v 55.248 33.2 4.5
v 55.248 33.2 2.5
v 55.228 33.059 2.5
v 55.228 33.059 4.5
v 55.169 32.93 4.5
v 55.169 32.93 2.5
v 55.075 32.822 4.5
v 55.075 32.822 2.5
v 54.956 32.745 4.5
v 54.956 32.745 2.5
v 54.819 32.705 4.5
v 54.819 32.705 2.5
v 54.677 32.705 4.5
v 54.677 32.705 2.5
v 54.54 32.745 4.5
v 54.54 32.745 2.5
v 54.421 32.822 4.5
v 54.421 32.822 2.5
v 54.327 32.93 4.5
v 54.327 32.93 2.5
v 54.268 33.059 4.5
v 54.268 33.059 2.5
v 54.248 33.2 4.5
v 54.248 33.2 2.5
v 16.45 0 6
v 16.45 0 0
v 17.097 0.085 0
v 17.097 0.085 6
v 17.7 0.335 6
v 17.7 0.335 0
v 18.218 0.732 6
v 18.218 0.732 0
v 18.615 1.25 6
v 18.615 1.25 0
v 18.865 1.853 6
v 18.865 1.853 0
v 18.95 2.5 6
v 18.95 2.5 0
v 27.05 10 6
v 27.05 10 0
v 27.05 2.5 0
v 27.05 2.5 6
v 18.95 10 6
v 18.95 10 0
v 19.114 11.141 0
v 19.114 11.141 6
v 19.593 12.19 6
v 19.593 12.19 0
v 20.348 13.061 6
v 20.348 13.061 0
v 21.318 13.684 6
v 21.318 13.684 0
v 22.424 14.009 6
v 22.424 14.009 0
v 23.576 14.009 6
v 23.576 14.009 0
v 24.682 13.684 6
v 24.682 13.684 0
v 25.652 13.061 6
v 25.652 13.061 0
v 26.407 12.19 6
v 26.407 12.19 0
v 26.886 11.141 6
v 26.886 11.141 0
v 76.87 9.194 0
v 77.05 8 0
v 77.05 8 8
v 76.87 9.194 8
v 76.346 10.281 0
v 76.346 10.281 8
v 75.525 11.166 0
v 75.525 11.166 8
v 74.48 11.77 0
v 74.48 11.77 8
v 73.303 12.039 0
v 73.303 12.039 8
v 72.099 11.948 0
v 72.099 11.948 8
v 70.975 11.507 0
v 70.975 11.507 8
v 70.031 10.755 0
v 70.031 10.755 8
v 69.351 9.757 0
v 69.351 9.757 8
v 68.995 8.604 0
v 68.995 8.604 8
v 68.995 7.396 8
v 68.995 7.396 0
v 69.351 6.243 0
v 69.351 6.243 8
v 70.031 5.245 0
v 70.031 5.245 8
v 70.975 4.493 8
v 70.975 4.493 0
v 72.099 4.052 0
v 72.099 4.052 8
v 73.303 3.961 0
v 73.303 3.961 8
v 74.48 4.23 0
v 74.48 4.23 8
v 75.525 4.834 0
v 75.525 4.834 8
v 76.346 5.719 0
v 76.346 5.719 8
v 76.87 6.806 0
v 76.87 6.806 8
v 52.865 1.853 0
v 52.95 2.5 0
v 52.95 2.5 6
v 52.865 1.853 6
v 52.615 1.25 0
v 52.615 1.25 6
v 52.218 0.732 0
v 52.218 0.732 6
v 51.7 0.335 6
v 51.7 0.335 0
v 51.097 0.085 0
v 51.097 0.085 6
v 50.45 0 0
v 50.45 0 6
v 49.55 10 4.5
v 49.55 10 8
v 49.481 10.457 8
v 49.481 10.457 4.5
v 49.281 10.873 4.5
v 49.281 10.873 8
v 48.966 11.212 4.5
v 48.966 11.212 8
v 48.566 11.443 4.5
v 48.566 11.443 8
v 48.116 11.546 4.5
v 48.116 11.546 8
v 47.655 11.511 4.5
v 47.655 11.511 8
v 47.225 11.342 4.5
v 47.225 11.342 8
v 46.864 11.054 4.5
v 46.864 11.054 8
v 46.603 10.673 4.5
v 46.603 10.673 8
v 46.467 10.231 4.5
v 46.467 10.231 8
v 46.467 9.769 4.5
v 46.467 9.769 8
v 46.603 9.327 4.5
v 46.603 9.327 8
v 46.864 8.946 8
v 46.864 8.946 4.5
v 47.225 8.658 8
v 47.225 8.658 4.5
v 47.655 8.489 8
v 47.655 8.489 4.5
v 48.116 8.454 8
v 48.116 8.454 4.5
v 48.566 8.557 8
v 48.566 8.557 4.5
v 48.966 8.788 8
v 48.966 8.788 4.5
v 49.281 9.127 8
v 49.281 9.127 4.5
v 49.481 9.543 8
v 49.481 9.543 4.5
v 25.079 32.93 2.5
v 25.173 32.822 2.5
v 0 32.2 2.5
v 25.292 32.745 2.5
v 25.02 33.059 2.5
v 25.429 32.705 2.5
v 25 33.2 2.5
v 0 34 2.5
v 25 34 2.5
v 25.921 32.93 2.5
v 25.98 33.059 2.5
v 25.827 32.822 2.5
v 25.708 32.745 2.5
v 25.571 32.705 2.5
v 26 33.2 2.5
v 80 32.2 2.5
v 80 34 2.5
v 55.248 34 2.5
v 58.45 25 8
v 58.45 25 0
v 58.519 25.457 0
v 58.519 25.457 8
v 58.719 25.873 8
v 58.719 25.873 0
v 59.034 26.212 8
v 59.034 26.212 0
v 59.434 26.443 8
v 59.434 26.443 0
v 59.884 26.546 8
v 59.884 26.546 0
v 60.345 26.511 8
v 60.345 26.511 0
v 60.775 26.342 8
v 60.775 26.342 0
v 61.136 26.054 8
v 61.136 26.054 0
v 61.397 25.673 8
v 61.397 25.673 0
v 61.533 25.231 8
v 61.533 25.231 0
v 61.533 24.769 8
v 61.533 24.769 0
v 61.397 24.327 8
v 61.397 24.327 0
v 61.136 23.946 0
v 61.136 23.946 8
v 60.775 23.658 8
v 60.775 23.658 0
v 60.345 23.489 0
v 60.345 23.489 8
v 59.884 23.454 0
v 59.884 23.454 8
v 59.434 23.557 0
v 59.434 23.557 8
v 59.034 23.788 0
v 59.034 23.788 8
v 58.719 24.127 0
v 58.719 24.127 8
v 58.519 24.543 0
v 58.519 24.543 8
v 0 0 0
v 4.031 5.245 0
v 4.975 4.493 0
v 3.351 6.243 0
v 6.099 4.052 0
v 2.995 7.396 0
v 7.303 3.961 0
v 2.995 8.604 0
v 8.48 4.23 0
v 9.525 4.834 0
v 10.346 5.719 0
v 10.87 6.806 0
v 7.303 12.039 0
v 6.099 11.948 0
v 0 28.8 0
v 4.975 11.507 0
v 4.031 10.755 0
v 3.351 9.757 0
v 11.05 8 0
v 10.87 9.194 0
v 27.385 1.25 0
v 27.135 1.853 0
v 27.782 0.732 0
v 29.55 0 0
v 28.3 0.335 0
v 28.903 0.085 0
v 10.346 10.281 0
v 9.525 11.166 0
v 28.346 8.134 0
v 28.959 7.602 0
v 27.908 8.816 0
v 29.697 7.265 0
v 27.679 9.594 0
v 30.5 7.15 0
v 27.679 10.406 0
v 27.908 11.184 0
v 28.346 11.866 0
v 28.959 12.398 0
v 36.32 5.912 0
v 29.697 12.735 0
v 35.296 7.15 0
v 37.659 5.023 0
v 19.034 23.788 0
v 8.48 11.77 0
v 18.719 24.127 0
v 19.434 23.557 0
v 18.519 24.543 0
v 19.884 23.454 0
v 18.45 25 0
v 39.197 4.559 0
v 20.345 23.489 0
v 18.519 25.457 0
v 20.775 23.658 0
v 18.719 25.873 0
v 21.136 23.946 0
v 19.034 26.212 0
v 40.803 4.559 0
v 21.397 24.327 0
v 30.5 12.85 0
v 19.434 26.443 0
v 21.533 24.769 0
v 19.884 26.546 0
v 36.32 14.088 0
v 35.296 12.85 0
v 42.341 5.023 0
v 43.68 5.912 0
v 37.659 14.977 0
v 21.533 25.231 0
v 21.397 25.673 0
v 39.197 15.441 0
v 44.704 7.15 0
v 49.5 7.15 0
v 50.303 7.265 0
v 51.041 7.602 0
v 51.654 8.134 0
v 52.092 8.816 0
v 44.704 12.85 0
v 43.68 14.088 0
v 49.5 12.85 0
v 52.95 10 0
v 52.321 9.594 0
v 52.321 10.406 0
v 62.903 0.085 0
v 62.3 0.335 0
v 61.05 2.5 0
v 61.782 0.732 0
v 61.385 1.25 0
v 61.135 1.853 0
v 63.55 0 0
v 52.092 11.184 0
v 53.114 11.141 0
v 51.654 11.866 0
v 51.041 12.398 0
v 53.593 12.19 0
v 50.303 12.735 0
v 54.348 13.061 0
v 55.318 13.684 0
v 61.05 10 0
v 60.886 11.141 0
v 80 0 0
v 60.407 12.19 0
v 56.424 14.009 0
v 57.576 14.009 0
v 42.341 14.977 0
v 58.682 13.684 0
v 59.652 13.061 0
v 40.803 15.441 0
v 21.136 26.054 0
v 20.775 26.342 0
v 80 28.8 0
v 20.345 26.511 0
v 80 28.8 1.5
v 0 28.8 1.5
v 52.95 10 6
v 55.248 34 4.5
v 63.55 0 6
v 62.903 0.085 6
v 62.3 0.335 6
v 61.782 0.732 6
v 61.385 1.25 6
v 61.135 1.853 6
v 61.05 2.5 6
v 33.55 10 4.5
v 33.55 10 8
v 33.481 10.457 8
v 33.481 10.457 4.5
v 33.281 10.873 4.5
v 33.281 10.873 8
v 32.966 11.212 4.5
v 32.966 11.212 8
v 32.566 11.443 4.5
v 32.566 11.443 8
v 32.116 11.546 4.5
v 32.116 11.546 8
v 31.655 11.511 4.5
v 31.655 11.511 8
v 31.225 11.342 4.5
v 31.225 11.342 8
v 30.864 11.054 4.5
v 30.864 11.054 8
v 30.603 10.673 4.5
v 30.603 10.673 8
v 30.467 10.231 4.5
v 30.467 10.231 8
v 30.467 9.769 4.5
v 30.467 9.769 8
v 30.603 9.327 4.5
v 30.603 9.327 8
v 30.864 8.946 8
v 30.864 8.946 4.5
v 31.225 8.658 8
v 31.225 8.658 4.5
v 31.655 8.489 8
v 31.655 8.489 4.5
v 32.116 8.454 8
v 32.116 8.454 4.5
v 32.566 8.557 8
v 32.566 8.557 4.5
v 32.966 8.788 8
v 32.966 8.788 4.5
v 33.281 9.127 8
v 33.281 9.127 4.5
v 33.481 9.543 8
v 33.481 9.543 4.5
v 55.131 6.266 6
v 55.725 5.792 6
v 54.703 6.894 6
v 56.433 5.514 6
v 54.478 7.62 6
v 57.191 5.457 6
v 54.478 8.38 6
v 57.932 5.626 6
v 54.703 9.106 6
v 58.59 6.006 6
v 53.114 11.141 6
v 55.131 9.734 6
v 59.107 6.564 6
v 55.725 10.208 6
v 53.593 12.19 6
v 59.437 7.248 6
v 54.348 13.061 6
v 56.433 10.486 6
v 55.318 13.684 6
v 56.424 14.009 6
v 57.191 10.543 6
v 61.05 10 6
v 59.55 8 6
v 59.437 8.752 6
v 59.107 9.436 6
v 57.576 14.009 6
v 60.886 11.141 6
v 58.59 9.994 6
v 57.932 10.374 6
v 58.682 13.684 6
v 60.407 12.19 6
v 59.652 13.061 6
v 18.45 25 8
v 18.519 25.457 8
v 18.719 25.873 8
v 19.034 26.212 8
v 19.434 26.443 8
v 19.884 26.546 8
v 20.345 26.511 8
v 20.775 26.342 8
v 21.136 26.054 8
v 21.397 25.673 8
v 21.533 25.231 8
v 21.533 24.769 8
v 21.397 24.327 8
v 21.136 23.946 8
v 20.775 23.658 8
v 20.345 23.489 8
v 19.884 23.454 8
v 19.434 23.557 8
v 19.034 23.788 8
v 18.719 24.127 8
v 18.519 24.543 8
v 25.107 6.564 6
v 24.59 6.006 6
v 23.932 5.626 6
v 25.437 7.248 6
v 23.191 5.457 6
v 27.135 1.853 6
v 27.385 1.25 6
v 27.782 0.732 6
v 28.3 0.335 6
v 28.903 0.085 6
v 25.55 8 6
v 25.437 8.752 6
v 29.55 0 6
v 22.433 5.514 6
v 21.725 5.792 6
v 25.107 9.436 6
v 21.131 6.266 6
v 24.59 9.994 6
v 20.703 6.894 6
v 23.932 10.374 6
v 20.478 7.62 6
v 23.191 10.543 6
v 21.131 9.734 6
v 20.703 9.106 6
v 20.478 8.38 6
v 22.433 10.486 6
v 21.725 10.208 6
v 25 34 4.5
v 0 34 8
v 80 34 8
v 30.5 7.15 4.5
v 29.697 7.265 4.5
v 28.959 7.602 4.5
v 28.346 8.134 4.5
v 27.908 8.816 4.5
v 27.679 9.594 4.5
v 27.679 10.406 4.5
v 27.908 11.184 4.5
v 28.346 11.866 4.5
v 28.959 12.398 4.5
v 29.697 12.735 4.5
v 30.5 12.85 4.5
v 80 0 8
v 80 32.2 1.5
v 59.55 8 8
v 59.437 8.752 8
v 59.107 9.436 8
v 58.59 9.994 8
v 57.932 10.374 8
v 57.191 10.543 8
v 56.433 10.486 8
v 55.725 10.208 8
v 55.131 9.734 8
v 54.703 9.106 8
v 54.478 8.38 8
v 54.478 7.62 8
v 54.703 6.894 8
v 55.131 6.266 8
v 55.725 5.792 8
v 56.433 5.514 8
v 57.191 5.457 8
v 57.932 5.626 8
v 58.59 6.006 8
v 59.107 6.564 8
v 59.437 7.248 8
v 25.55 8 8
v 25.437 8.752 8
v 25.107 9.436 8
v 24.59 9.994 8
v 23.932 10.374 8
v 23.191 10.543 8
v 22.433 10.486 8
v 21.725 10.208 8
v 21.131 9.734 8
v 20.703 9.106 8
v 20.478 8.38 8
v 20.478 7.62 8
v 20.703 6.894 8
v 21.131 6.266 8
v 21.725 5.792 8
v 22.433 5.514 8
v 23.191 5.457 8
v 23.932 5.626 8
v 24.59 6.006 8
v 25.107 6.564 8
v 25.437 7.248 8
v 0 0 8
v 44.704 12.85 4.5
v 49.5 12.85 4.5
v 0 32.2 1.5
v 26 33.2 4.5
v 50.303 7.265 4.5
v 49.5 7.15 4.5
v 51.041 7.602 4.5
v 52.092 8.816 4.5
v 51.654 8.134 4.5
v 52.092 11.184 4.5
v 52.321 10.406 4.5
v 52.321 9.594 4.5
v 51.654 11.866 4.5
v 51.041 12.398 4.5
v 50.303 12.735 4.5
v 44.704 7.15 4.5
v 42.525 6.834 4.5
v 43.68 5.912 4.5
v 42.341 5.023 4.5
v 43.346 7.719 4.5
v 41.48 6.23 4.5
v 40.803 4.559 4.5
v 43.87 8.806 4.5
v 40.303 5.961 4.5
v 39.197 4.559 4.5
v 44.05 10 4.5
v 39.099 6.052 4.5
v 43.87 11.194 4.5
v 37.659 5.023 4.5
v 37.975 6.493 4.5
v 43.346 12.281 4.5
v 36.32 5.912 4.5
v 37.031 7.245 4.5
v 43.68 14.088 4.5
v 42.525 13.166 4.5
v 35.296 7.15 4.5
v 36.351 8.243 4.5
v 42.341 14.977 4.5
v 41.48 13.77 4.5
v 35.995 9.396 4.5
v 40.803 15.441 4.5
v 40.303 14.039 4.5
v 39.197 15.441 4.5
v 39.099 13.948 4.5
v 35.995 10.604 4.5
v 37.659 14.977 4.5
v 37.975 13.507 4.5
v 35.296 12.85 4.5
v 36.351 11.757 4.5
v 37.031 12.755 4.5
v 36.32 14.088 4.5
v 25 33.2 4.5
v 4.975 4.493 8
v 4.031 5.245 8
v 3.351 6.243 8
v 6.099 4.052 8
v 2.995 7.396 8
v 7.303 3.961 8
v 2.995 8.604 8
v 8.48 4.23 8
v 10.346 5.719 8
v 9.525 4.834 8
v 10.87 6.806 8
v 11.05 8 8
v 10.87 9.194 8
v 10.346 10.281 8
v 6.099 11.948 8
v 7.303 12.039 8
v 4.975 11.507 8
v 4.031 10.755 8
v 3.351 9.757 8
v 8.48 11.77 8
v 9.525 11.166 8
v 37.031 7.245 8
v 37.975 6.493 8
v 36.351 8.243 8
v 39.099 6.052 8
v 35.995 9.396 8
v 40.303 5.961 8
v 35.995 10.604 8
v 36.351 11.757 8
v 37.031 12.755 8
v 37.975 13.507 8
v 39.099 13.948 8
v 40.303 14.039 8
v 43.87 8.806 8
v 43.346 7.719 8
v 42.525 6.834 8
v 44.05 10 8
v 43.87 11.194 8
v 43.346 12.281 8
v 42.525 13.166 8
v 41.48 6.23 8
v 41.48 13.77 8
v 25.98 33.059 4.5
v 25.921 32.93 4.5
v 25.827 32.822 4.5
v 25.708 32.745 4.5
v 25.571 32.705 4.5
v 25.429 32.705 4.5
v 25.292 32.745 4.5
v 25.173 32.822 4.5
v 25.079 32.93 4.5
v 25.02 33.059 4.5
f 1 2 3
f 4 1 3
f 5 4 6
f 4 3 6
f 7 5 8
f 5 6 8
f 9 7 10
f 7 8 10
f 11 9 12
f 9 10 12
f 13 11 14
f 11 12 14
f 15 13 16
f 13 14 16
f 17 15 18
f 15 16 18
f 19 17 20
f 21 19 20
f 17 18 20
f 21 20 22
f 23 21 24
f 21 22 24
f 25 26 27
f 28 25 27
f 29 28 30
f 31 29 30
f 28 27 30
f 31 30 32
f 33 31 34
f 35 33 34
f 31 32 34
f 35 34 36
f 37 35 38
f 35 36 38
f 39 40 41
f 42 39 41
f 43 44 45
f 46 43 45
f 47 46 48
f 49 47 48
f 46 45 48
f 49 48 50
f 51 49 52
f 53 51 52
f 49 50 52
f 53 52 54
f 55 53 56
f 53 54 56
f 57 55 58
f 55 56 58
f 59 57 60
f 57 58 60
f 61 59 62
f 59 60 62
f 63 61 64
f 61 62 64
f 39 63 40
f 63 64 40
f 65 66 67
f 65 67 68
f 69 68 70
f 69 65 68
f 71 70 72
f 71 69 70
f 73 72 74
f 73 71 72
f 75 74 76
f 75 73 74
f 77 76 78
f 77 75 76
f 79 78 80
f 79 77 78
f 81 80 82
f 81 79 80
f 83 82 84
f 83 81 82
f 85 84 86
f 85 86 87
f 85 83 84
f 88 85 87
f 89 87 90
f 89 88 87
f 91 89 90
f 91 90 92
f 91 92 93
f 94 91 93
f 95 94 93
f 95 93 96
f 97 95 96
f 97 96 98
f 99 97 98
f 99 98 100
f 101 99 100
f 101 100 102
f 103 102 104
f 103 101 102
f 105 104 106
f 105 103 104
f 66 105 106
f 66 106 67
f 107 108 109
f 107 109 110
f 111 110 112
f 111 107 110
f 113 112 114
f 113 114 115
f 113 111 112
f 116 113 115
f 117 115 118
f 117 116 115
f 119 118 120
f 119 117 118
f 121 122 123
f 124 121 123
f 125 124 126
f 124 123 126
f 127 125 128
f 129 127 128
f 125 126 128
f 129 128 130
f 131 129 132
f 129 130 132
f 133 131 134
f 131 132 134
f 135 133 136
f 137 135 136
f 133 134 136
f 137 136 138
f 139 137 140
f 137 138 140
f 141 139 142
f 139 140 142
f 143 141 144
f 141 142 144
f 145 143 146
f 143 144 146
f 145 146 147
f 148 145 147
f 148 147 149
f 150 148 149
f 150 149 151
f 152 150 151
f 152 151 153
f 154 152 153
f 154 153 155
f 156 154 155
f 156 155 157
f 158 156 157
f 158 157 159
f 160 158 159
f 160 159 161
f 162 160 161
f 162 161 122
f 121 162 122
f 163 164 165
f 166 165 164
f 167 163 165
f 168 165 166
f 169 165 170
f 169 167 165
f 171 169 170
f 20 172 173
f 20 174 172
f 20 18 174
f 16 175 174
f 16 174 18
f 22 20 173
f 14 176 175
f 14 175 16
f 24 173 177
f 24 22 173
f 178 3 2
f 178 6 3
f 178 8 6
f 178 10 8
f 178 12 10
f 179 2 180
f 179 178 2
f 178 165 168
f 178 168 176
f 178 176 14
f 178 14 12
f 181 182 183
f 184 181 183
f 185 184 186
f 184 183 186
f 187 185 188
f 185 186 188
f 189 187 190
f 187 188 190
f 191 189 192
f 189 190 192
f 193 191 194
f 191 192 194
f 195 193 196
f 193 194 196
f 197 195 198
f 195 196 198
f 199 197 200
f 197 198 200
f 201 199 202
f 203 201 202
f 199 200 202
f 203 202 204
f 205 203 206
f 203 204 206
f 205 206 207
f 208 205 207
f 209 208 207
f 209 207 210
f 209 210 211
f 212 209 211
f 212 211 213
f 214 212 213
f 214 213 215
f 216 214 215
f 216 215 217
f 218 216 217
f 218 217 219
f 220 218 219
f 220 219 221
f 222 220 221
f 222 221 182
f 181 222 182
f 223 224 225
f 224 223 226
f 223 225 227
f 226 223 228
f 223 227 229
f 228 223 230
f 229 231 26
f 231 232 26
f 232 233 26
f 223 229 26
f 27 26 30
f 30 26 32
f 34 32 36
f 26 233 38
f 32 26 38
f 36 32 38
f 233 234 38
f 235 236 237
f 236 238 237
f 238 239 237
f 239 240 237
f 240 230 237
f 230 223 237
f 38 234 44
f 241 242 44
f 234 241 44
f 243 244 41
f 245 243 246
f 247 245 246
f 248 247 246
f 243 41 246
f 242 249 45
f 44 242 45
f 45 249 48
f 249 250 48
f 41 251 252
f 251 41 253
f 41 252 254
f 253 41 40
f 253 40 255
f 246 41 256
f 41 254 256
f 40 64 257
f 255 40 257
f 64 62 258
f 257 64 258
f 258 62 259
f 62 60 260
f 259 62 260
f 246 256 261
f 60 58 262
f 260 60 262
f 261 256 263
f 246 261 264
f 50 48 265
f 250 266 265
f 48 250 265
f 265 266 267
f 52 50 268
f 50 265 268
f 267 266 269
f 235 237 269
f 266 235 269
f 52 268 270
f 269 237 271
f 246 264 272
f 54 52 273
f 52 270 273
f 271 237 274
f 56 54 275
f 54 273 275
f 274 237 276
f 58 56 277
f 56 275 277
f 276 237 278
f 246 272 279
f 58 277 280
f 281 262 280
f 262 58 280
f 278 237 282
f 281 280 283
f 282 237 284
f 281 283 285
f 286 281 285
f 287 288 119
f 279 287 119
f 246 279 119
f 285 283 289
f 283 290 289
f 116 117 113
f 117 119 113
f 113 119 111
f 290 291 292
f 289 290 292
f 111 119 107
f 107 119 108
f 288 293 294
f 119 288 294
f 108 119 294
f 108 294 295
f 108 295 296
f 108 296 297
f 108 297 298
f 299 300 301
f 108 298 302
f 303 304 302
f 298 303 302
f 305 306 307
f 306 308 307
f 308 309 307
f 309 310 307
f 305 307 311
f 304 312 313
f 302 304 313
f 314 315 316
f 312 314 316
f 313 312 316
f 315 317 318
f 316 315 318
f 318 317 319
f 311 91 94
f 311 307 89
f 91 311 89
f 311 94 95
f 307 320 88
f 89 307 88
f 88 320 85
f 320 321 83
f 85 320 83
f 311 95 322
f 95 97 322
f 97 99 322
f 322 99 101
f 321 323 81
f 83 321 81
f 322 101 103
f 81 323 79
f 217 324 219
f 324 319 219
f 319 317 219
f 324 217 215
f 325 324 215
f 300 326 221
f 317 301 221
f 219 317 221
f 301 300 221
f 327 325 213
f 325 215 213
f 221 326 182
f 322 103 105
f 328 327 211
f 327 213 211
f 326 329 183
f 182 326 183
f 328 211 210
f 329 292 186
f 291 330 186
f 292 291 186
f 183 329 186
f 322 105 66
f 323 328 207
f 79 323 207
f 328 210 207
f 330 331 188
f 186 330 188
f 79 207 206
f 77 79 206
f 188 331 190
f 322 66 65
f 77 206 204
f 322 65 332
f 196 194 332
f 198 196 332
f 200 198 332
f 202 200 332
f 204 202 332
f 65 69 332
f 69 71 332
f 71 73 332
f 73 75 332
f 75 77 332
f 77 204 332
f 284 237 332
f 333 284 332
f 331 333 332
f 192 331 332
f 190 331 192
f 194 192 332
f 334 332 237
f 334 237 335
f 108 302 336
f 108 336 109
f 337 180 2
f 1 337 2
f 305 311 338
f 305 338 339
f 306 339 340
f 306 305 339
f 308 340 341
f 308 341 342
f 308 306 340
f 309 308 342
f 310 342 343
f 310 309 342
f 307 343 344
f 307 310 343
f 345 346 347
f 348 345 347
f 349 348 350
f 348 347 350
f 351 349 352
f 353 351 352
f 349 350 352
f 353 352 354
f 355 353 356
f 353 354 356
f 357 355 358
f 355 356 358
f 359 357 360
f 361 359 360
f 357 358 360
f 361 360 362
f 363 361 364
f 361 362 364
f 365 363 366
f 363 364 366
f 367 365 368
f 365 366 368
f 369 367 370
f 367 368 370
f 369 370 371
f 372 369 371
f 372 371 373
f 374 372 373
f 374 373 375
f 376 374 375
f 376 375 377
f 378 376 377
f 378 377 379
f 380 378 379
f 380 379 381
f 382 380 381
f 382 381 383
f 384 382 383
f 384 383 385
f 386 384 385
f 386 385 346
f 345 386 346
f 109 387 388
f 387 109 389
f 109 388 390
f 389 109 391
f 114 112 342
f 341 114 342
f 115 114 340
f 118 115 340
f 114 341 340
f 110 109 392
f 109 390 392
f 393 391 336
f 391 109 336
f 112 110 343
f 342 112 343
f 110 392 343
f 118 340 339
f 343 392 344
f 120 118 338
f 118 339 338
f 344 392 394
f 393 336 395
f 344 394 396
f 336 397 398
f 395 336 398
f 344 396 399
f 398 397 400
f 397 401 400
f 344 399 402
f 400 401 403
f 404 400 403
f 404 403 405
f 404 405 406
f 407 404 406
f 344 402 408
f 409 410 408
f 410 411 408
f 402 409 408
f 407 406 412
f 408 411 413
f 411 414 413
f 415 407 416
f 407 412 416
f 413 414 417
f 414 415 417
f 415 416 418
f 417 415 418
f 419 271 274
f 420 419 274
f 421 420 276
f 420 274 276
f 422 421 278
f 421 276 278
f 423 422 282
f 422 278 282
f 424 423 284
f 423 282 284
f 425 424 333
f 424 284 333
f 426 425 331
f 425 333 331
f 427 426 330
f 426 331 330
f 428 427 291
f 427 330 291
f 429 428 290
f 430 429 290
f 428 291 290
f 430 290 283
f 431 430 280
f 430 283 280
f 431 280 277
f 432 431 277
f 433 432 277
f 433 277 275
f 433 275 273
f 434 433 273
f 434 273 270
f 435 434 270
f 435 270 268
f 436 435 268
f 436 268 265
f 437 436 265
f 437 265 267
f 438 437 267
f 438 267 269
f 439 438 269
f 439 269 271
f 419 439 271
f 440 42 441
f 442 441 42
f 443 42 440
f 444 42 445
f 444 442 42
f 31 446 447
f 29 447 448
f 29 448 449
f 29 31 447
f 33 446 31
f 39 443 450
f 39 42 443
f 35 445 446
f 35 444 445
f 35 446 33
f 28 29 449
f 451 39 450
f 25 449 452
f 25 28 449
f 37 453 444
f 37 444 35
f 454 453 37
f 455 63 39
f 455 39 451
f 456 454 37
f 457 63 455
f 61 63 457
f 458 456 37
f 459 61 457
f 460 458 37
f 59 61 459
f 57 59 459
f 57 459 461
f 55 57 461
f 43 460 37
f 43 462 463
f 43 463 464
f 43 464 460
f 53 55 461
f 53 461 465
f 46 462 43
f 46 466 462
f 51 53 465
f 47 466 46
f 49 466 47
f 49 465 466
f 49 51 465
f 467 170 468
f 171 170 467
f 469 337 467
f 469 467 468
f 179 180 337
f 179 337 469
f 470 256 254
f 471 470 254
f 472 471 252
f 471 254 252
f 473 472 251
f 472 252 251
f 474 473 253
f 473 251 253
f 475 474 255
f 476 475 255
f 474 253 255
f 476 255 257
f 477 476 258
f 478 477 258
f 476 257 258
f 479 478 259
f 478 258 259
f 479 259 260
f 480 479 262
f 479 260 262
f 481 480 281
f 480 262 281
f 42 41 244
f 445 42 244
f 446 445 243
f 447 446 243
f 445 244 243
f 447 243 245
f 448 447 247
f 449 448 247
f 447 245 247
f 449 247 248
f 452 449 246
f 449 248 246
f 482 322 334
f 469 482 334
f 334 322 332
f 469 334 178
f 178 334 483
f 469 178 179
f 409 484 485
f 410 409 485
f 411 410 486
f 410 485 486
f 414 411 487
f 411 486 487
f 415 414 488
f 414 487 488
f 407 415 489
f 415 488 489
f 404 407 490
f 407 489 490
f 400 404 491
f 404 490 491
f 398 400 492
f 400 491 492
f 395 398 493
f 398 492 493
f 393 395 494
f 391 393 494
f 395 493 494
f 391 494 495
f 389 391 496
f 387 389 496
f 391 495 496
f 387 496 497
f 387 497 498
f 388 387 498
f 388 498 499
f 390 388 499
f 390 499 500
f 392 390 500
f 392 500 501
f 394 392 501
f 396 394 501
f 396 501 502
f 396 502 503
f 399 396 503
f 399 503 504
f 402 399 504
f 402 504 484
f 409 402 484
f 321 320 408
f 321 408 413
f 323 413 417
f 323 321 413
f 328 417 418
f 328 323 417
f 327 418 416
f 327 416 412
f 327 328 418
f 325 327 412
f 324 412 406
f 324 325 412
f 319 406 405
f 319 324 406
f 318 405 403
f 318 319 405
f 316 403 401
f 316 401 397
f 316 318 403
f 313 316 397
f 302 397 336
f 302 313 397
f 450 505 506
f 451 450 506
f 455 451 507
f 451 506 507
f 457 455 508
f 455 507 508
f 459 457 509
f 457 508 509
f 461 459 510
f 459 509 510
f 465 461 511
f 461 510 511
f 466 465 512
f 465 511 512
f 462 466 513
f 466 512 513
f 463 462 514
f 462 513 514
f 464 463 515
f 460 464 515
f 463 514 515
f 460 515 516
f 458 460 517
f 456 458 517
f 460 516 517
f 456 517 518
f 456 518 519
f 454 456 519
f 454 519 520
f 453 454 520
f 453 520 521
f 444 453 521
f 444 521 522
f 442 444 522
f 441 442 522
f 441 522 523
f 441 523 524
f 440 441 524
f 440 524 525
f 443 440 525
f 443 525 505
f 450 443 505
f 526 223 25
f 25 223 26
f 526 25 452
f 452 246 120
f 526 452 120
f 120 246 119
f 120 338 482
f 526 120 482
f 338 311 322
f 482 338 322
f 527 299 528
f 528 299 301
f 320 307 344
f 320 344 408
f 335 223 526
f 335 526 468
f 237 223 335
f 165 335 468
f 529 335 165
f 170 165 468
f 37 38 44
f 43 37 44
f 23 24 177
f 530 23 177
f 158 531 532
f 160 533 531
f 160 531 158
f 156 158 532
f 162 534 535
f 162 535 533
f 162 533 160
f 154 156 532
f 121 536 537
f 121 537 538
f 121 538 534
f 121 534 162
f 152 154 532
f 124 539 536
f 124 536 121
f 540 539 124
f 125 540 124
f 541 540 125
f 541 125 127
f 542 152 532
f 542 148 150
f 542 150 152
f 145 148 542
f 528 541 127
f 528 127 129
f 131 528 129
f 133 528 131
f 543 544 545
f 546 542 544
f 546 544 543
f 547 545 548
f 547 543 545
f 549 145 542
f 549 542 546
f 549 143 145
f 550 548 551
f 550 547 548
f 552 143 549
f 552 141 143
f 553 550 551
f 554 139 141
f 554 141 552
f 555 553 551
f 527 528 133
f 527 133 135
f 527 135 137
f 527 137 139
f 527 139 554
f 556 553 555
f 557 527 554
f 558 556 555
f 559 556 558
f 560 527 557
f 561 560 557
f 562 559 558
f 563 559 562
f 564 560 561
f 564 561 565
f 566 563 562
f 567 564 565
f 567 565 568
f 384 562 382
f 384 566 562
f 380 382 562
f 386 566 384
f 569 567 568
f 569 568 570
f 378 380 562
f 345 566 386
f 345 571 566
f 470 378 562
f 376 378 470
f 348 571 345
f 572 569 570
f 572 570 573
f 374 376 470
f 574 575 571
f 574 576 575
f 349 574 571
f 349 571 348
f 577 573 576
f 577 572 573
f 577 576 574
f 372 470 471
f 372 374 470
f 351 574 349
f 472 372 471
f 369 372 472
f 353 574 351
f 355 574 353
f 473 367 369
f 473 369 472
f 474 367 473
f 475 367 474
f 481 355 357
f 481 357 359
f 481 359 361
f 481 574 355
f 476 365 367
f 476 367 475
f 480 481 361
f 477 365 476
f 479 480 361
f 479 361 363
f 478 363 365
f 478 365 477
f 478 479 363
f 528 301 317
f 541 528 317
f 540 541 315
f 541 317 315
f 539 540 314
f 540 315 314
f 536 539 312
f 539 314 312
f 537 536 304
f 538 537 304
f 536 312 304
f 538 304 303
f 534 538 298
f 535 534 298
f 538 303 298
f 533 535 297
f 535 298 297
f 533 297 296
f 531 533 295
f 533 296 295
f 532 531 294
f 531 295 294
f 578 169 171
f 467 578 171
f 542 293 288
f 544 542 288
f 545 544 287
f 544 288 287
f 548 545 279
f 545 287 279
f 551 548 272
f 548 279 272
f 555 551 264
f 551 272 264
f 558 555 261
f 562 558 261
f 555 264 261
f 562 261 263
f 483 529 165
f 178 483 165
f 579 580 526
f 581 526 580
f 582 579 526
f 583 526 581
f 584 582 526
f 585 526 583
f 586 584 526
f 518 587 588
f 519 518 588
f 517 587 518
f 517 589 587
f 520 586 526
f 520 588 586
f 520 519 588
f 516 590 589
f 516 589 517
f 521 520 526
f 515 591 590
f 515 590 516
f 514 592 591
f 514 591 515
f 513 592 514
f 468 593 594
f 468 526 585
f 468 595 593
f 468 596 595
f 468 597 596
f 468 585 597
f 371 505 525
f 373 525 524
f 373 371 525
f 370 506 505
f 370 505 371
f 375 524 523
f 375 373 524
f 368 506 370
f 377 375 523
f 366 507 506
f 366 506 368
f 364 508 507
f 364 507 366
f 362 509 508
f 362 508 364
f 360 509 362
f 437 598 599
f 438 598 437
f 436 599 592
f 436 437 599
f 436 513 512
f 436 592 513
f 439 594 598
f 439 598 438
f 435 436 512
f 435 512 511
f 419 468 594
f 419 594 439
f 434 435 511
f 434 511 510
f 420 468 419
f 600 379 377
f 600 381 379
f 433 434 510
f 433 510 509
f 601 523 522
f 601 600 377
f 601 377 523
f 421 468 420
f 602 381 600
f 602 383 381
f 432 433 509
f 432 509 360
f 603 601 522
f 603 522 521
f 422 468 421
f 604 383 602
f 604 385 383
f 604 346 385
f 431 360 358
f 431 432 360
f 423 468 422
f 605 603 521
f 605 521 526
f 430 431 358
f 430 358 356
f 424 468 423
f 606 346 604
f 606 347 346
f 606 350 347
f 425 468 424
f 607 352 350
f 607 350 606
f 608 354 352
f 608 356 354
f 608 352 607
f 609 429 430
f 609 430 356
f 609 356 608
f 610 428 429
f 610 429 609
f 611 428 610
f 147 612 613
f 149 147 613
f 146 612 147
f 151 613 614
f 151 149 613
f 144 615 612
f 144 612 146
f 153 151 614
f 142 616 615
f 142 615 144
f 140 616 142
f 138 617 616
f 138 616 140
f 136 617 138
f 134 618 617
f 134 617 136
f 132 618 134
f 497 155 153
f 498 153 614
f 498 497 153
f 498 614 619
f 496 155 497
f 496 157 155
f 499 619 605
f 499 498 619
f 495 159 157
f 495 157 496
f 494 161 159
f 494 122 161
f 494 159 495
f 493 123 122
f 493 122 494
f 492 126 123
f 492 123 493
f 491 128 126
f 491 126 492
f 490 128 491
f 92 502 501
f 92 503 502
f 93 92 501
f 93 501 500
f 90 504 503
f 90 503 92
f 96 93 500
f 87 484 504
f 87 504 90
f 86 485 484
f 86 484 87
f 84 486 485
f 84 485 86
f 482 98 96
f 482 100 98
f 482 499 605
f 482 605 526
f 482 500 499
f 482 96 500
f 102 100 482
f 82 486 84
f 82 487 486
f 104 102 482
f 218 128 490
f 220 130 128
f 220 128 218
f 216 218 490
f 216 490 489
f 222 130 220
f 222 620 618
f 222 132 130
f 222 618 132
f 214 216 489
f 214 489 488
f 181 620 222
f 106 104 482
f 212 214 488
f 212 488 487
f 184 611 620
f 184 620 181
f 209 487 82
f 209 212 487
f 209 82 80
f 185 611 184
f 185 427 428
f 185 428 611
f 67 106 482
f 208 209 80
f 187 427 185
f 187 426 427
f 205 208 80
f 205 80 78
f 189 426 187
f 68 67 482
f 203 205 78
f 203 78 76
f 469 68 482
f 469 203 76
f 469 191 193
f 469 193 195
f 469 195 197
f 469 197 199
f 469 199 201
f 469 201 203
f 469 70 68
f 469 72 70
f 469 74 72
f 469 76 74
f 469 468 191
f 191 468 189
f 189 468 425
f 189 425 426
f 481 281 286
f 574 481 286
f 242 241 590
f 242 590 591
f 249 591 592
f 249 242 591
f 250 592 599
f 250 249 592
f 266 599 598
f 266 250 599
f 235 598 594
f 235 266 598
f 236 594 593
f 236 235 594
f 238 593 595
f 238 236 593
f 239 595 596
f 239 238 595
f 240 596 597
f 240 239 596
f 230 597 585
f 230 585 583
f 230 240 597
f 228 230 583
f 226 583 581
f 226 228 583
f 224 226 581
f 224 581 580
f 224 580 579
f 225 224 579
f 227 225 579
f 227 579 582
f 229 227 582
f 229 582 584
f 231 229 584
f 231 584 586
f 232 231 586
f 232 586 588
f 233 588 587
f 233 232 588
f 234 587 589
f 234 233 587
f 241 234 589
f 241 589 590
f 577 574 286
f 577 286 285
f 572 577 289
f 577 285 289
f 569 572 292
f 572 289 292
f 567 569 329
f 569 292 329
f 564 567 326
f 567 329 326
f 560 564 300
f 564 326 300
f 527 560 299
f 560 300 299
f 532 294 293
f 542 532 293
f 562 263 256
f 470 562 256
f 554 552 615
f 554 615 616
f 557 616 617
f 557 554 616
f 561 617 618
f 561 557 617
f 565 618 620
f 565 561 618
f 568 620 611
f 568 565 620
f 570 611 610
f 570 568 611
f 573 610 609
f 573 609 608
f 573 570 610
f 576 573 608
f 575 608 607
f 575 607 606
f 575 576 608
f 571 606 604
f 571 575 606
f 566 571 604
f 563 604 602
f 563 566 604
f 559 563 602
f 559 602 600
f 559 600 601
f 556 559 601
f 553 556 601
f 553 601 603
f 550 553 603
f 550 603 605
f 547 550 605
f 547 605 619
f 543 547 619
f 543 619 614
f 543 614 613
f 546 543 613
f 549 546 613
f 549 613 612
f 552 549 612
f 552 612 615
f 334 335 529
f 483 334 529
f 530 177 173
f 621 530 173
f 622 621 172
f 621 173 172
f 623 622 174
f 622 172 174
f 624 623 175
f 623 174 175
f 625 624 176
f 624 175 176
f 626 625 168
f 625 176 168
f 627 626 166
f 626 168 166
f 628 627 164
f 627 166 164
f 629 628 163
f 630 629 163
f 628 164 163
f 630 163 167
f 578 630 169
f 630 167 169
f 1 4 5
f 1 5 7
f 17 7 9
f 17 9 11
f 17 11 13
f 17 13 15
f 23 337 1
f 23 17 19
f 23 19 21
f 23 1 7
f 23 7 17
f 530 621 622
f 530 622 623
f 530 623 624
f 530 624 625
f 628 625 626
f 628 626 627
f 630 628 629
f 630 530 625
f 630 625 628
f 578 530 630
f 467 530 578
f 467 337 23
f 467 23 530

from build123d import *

# Parameters (mm, degrees)
SKETCH_2_W           = 80
SKETCH_2_H           = 34
SKETCH_2_R           = 4.05
EXTRUDE_1_DEPTH      = 8
SKETCH_3_R           = 2.55
CUT_EXTRUDE_1_DEPTH  = 88.292611371
CUT_EXTRUDE_2_DEPTH  = 88.292611371
SKETCH_5_R           = 1.55
CUT_EXTRUDE_3_DEPTH  = 88.292611371
CUT_EXTRUDE_4_DEPTH  = 6
CUT_EXTRUDE_5_DEPTH  = 4.5
SKETCH_20_R          = 5.5
CUT_EXTRUDE_12_DEPTH = 4.5
SKETCH_11_R          = 1.55
CUT_EXTRUDE_7_DEPTH  = 88.292611371
CUT_EXTRUDE_11_DEPTH = 2


with BuildPart() as part:
    # 草图2 → 凸台-拉伸1 (new body)
    with BuildSketch(Plane.XY):
        with Locations((40, 17)):
            Rectangle(SKETCH_2_W, SKETCH_2_H)
        with Locations((7, 8)):
            Circle(SKETCH_2_R, mode=Mode.SUBTRACT)
        with Locations((40, 10)):
            Circle(SKETCH_2_R, mode=Mode.SUBTRACT)
        with Locations((73, 8)):
            Circle(SKETCH_2_R, mode=Mode.SUBTRACT)
    extrude(amount=EXTRUDE_1_DEPTH)

    # 草图3 → 切除-拉伸1 (cut, through all)
    with BuildSketch(Plane.XY.offset(8)):
        with Locations((23, 8)):
            Circle(SKETCH_3_R)
        with Locations((57, 8)):
            Circle(SKETCH_3_R)
    extrude(amount=-CUT_EXTRUDE_1_DEPTH, mode=Mode.SUBTRACT)

    # 草图4 → 切除-拉伸2 (cut, through all)
    with BuildSketch(Plane(origin=(80, 0, 0), x_dir=(0, 0, -1), z_dir=(1, 0, 0))):
        Polygon((-1.5, 32.2), (-2.5, 32.2), (-2.5, 34), (0, 34), (0, 28.8), (-1.5, 28.8), align=None)
    extrude(amount=-CUT_EXTRUDE_2_DEPTH, mode=Mode.SUBTRACT)

    # 草图5 → 切除-拉伸3 (cut, through all)
    with BuildSketch(Plane.XY.offset(8)):
        with Locations((48, 10)):
            Circle(SKETCH_5_R)
        with Locations((32, 10)):
            Circle(SKETCH_5_R)
    extrude(amount=-CUT_EXTRUDE_3_DEPTH, mode=Mode.SUBTRACT)

    # 草图7 → 切除-拉伸4 (cut)
    with BuildSketch(Plane(origin=(0, 0, 0), x_dir=(-1, 0, 0), z_dir=(0, 0, -1))):
        with BuildLine():
            Line((-27.05, 10), (-27.05, 2.5))
            ThreePointArc((-27.05, 2.5), (-27.782233047, 0.732233047), (-29.55, 0))
            Line((-29.55, 0), (-16.45, 0))
            ThreePointArc((-16.45, 0), (-18.217766953, 0.732233047), (-18.95, 2.5))
            Line((-18.95, 2.5), (-18.95, 10))
            ThreePointArc((-18.95, 10), (-23, 14.05), (-27.05, 10))
        make_face()
        with BuildLine():
            Line((-61.05, 2.5), (-61.05, 10))
            ThreePointArc((-61.05, 10), (-57, 14.05), (-52.95, 10))
            Line((-52.95, 10), (-52.95, 2.5))
            ThreePointArc((-52.95, 2.5), (-52.217766953, 0.732233047), (-50.45, 0))
            Line((-50.45, 0), (-63.55, 0))
            ThreePointArc((-63.55, 0), (-61.782233047, 0.732233047), (-61.05, 2.5))
        make_face()
    extrude(amount=-CUT_EXTRUDE_4_DEPTH, mode=Mode.SUBTRACT)

    # 草图8 → 切除-拉伸5 (cut)
    with BuildSketch(Plane(origin=(0, 0, 0), x_dir=(-1, 0, 0), z_dir=(0, 0, -1))):
        with BuildLine():
            Line((-30.5, 12.85), (-49.5, 12.85))
            ThreePointArc((-49.5, 12.85), (-52.35, 10), (-49.5, 7.15))
            Line((-49.5, 7.15), (-30.5, 7.15))
            ThreePointArc((-30.5, 7.15), (-27.65, 10), (-30.5, 12.85))
        make_face()
    extrude(amount=-CUT_EXTRUDE_5_DEPTH, mode=Mode.SUBTRACT)

    # 草图20 → 切除-拉伸12 (cut)
    with BuildSketch(Plane(origin=(0, 0, 0), x_dir=(-1, 0, 0), z_dir=(0, 0, -1))):
        with Locations((-40, 10)):
            Circle(SKETCH_20_R)
    extrude(amount=-CUT_EXTRUDE_12_DEPTH, mode=Mode.SUBTRACT)

    # 草图11 → 切除-拉伸7 (cut, through all)
    with BuildSketch(Plane(origin=(0, 0, 0), x_dir=(-1, 0, 0), z_dir=(0, 0, -1))):
        with Locations((-60, 25)):
            Circle(SKETCH_11_R)
        with Locations((-20, 25)):
            Circle(SKETCH_11_R)
    extrude(amount=-CUT_EXTRUDE_7_DEPTH, mode=Mode.SUBTRACT)

    # 草图19 → 切除-拉伸11 (cut)
    with BuildSketch(Plane(origin=(0, 0, 2.5), x_dir=(-1, 0, 0), z_dir=(0, 0, -1))):
        with BuildLine():
            Line((-25, 34), (-55.247938178, 34))
            Line((-55.247938178, 34), (-55.247938178, 33.2))
            ThreePointArc((-55.247938178, 33.2), (-54.747938178, 32.7), (-54.247938178, 33.2))
            Line((-54.247938178, 33.2), (-26, 33.2))
            ThreePointArc((-26, 33.2), (-25.5, 32.7), (-25, 33.2))
            Line((-25, 33.2), (-25, 34))
        make_face()
    extrude(amount=-CUT_EXTRUDE_11_DEPTH, mode=Mode.SUBTRACT)


solid = part.part
